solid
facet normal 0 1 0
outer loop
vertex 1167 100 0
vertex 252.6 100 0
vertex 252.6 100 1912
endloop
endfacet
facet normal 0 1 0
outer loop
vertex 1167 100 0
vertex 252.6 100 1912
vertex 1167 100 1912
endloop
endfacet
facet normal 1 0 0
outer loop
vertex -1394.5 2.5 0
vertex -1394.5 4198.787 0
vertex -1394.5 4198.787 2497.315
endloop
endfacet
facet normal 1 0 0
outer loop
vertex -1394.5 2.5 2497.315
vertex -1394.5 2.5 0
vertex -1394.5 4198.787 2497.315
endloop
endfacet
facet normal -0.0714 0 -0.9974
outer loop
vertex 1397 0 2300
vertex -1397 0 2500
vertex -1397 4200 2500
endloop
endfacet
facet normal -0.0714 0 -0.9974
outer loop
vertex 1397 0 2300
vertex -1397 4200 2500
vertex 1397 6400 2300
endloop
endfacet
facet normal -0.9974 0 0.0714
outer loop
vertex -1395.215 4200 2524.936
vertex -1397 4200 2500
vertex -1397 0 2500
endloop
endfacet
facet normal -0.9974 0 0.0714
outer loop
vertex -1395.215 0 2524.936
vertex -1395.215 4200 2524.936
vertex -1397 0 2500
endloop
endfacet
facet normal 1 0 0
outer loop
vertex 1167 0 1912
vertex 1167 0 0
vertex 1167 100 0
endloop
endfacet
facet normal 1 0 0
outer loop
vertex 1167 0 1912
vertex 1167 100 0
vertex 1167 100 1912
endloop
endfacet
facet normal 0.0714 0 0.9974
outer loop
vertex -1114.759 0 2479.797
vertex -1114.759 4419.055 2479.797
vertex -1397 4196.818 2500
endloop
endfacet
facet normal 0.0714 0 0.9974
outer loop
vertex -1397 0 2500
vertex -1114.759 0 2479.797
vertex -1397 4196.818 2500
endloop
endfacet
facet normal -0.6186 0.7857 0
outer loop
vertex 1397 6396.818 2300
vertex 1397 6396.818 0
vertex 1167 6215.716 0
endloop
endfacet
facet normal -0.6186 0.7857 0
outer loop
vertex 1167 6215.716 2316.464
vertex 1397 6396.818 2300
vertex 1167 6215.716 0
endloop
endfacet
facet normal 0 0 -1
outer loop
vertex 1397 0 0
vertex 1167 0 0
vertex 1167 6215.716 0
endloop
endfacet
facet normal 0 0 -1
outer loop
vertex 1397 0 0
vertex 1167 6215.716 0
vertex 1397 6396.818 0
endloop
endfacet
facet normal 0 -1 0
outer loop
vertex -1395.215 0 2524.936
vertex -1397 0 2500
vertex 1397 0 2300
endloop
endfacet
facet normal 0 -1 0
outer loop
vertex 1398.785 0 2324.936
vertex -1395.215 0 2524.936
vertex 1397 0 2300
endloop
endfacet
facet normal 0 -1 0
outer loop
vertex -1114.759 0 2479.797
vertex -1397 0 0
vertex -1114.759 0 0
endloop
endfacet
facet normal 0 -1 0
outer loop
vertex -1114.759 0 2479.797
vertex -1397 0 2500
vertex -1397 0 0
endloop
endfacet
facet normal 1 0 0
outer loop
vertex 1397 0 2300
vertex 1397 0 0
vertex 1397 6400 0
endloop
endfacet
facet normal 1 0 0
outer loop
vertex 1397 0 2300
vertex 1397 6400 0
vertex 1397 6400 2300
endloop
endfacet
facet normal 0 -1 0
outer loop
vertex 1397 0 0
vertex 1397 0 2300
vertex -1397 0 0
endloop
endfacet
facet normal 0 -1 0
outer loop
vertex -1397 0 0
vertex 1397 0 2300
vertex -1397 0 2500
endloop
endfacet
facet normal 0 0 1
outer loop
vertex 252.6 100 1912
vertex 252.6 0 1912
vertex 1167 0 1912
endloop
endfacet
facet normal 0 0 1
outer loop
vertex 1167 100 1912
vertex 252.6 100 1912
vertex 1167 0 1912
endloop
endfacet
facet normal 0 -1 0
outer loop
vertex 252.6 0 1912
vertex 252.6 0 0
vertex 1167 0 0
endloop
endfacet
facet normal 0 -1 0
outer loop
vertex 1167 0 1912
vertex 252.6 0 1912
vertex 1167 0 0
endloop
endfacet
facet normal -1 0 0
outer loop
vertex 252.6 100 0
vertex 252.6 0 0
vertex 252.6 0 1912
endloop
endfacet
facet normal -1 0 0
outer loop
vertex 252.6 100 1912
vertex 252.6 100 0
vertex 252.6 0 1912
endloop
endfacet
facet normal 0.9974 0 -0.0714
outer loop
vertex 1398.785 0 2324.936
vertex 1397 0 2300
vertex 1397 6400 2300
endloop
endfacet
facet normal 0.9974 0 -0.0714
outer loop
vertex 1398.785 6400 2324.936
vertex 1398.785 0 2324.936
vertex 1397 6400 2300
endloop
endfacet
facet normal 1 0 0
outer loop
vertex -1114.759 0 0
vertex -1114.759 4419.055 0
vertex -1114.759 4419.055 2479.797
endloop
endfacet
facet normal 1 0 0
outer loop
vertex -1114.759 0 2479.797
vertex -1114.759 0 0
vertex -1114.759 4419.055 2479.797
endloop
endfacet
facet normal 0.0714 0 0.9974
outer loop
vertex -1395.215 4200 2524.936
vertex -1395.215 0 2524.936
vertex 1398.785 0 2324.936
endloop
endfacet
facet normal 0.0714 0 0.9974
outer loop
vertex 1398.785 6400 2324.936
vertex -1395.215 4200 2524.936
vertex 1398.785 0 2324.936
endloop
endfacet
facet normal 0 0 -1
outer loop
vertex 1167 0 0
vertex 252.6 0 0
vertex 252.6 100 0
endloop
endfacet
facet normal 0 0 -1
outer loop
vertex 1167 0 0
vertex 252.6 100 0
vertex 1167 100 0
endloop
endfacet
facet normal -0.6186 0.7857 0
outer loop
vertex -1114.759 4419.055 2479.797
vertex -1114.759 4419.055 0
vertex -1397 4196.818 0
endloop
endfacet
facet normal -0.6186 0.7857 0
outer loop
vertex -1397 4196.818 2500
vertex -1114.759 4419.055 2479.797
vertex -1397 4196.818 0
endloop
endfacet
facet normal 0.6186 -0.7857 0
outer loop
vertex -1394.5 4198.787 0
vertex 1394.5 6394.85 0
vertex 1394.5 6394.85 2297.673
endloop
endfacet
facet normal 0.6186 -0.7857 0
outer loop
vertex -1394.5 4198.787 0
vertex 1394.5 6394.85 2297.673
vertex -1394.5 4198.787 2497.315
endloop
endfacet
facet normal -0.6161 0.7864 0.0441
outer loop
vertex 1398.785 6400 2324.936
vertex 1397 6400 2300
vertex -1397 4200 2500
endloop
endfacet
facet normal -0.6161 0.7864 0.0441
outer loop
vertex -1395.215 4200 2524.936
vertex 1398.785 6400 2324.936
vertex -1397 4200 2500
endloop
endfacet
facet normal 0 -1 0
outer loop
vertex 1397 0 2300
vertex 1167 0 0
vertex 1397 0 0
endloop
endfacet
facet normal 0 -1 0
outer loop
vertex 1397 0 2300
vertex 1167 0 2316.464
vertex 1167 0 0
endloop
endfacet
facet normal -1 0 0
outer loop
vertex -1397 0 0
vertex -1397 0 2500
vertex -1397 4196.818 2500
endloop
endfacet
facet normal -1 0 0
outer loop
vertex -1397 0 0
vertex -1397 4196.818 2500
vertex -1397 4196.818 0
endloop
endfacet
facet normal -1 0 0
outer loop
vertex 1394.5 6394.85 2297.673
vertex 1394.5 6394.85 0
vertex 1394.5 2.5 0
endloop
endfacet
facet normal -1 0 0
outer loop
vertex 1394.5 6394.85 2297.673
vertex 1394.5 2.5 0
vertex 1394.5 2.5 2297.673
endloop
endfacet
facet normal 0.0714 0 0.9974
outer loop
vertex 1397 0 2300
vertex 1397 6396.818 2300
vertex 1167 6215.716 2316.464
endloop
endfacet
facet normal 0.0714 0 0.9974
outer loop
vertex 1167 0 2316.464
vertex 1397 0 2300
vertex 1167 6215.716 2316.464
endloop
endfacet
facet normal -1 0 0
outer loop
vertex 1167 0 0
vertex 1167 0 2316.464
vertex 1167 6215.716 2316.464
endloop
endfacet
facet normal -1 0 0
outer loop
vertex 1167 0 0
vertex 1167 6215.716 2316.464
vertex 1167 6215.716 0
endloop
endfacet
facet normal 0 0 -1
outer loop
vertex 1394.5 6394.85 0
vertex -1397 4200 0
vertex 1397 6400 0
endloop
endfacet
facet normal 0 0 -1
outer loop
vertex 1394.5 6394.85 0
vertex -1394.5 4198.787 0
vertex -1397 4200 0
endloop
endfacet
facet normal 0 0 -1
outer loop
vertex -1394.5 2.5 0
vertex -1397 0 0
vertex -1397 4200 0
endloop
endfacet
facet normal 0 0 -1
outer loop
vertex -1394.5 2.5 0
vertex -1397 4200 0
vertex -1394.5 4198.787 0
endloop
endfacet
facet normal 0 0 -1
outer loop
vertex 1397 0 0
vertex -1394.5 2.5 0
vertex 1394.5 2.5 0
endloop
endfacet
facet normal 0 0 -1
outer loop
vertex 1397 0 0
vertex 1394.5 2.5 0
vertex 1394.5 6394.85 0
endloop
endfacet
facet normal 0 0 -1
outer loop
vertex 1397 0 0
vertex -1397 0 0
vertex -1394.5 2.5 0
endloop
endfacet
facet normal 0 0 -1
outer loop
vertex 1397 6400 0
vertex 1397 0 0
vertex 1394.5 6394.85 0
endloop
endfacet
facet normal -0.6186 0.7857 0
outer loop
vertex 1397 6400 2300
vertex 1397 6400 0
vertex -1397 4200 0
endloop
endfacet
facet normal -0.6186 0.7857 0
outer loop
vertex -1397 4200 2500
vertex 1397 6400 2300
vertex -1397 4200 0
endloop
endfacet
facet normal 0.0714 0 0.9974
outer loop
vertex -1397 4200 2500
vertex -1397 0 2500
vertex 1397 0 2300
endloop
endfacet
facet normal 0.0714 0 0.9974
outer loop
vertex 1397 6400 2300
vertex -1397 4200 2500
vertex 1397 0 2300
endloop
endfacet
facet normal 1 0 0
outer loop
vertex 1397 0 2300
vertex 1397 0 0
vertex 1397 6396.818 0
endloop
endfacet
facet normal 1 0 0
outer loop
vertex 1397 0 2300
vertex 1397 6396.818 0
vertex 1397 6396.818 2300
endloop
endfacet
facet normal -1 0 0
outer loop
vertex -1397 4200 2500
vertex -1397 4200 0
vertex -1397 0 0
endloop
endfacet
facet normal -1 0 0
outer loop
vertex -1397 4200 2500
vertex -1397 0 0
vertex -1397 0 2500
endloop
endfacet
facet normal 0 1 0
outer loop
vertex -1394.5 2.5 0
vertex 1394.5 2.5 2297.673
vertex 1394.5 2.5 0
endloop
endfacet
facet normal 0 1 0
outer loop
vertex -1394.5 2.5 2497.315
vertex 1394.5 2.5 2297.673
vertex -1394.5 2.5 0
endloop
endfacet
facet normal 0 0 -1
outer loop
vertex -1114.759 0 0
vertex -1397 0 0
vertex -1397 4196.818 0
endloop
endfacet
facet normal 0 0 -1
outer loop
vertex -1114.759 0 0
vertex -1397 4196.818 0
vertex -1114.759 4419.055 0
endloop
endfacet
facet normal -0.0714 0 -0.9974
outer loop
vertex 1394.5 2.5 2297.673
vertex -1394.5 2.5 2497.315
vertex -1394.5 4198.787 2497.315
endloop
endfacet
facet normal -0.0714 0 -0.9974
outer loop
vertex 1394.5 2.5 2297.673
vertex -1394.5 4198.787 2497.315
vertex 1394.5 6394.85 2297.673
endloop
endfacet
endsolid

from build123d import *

# Parameters (mm, degrees)
F0_W      = 1397
F0_H      = 2300
F1_DEPTH  = 6400
F3_DEPTH  = 6400
F5_REACH  = 6056.1837849536
F6_T      = -2.5
F9_DEPTH  = 25
F10_REACH = 8727.8551134481
F11_REACH = 8915.8825953498
F7_W      = 914.4
F7_H      = 1912
F12_DEPTH = 100


with BuildPart() as f1:
    # F0 (on Front) → F1 (new body)
    with BuildSketch(Plane.XZ):
        with Locations((-698.5, 1150)):
            Rectangle(F0_W, F0_H)
        with Locations((698.5, 1150)):
            Rectangle(F0_W, F0_H)
    extrude(amount=-F1_DEPTH)

    # F2 (on face) → F3 (join, through all)
    with BuildSketch(Plane(origin=(0, 6400, 0), x_dir=(-1, 0, 0), z_dir=(0, 1, 0))):
        Polygon((-1397, 2300), (1397, 2300), (1397, 2500), align=None)
    extrude(amount=-F3_DEPTH)

    f5_end = f1.faces().sort_by_distance((0, 3200, 2400))[0]
    # F4 (on face) → F5 (cut, up to a face of the model that its end follows)
    with BuildSketch(Plane(origin=(0, 0, 0), x_dir=(1, 0, 0), z_dir=(0, 0, -1))):
        Polygon((1397, -6400), (-1397, -4200), (-1397, -6400), align=None)
    f5_long = extrude(amount=-F5_REACH, mode=Mode.PRIVATE)
    add(split(f5_long, bisect_by=f5_end, keep=Keep.BOTTOM, mode=Mode.PRIVATE), mode=Mode.SUBTRACT)

    # F6
    f6_openings = [f1.faces().sort_by_distance(p)[0] for p in [
        (96.647799, 2688.050314, 0),
    ]]
    offset(amount=F6_T, openings=f6_openings)


with BuildPart() as f9:
    # F8 (on face) → F9 (new body)
    with BuildSketch(Plane(origin=(170.9209123735, 0, 2387.7651458573), x_dir=(0.9974478152, 0, -0.071399271), z_dir=(0.071399271, 0, 0.9974478152))):
        Polygon((1229.2162746817, 0), (1229.2162746817, 6400), (-1571.9327752619, 4200), (-1571.9327752619, 0), align=None)
    extrude(amount=F9_DEPTH)


with BuildPart() as f10:
    f10_end = Plane(origin=(-19.3536070615, 5281.5789575885, 1199.4394861824), x_dir=(-0.7856739006, -0.6186408666, 0), z_dir=(0.6186408666, -0.7856739006, 0))
    # F7 (on face) → F10 (new body, up to a plane its end follows)
    with BuildSketch(Plane.XZ):
        Polygon((1167, 1912), (1167, 0), (1397, 0), (1397, 2300), (1167, 2316.4638511095), align=None)
    f10_long = extrude(amount=-F10_REACH, mode=Mode.PRIVATE)
    add(split(f10_long, bisect_by=f10_end, keep=Keep.TOP, mode=Mode.PRIVATE))


with BuildPart() as f11:
    f11_end = Plane(origin=(-19.3536070615, 5281.5789575885, 1199.4394861824), x_dir=(-0.7856739006, -0.6186408666, 0), z_dir=(0.6186408666, -0.7856739006, 0))
    # F7 (on face) → F11 (new body, up to a plane its end follows)
    with BuildSketch(Plane.XZ):
        Polygon((-1397, 0), (-1114.7586107254, 0), (-1114.7586107254, 1912), (-1114.7586107254, 2479.7966077828), (-1397, 2500), align=None)
    f11_long = extrude(amount=-F11_REACH, mode=Mode.PRIVATE)
    add(split(f11_long, bisect_by=f11_end, keep=Keep.TOP, mode=Mode.PRIVATE))


with BuildPart() as f12:
    # F7 (on face) → F12 (new body)
    with BuildSketch(Plane.XZ):
        with Locations((709.8, 956)):
            Rectangle(F7_W, F7_H)
    extrude(amount=-F12_DEPTH)


solid = Compound([f1.part, f9.part, f10.part, f11.part, f12.part])
